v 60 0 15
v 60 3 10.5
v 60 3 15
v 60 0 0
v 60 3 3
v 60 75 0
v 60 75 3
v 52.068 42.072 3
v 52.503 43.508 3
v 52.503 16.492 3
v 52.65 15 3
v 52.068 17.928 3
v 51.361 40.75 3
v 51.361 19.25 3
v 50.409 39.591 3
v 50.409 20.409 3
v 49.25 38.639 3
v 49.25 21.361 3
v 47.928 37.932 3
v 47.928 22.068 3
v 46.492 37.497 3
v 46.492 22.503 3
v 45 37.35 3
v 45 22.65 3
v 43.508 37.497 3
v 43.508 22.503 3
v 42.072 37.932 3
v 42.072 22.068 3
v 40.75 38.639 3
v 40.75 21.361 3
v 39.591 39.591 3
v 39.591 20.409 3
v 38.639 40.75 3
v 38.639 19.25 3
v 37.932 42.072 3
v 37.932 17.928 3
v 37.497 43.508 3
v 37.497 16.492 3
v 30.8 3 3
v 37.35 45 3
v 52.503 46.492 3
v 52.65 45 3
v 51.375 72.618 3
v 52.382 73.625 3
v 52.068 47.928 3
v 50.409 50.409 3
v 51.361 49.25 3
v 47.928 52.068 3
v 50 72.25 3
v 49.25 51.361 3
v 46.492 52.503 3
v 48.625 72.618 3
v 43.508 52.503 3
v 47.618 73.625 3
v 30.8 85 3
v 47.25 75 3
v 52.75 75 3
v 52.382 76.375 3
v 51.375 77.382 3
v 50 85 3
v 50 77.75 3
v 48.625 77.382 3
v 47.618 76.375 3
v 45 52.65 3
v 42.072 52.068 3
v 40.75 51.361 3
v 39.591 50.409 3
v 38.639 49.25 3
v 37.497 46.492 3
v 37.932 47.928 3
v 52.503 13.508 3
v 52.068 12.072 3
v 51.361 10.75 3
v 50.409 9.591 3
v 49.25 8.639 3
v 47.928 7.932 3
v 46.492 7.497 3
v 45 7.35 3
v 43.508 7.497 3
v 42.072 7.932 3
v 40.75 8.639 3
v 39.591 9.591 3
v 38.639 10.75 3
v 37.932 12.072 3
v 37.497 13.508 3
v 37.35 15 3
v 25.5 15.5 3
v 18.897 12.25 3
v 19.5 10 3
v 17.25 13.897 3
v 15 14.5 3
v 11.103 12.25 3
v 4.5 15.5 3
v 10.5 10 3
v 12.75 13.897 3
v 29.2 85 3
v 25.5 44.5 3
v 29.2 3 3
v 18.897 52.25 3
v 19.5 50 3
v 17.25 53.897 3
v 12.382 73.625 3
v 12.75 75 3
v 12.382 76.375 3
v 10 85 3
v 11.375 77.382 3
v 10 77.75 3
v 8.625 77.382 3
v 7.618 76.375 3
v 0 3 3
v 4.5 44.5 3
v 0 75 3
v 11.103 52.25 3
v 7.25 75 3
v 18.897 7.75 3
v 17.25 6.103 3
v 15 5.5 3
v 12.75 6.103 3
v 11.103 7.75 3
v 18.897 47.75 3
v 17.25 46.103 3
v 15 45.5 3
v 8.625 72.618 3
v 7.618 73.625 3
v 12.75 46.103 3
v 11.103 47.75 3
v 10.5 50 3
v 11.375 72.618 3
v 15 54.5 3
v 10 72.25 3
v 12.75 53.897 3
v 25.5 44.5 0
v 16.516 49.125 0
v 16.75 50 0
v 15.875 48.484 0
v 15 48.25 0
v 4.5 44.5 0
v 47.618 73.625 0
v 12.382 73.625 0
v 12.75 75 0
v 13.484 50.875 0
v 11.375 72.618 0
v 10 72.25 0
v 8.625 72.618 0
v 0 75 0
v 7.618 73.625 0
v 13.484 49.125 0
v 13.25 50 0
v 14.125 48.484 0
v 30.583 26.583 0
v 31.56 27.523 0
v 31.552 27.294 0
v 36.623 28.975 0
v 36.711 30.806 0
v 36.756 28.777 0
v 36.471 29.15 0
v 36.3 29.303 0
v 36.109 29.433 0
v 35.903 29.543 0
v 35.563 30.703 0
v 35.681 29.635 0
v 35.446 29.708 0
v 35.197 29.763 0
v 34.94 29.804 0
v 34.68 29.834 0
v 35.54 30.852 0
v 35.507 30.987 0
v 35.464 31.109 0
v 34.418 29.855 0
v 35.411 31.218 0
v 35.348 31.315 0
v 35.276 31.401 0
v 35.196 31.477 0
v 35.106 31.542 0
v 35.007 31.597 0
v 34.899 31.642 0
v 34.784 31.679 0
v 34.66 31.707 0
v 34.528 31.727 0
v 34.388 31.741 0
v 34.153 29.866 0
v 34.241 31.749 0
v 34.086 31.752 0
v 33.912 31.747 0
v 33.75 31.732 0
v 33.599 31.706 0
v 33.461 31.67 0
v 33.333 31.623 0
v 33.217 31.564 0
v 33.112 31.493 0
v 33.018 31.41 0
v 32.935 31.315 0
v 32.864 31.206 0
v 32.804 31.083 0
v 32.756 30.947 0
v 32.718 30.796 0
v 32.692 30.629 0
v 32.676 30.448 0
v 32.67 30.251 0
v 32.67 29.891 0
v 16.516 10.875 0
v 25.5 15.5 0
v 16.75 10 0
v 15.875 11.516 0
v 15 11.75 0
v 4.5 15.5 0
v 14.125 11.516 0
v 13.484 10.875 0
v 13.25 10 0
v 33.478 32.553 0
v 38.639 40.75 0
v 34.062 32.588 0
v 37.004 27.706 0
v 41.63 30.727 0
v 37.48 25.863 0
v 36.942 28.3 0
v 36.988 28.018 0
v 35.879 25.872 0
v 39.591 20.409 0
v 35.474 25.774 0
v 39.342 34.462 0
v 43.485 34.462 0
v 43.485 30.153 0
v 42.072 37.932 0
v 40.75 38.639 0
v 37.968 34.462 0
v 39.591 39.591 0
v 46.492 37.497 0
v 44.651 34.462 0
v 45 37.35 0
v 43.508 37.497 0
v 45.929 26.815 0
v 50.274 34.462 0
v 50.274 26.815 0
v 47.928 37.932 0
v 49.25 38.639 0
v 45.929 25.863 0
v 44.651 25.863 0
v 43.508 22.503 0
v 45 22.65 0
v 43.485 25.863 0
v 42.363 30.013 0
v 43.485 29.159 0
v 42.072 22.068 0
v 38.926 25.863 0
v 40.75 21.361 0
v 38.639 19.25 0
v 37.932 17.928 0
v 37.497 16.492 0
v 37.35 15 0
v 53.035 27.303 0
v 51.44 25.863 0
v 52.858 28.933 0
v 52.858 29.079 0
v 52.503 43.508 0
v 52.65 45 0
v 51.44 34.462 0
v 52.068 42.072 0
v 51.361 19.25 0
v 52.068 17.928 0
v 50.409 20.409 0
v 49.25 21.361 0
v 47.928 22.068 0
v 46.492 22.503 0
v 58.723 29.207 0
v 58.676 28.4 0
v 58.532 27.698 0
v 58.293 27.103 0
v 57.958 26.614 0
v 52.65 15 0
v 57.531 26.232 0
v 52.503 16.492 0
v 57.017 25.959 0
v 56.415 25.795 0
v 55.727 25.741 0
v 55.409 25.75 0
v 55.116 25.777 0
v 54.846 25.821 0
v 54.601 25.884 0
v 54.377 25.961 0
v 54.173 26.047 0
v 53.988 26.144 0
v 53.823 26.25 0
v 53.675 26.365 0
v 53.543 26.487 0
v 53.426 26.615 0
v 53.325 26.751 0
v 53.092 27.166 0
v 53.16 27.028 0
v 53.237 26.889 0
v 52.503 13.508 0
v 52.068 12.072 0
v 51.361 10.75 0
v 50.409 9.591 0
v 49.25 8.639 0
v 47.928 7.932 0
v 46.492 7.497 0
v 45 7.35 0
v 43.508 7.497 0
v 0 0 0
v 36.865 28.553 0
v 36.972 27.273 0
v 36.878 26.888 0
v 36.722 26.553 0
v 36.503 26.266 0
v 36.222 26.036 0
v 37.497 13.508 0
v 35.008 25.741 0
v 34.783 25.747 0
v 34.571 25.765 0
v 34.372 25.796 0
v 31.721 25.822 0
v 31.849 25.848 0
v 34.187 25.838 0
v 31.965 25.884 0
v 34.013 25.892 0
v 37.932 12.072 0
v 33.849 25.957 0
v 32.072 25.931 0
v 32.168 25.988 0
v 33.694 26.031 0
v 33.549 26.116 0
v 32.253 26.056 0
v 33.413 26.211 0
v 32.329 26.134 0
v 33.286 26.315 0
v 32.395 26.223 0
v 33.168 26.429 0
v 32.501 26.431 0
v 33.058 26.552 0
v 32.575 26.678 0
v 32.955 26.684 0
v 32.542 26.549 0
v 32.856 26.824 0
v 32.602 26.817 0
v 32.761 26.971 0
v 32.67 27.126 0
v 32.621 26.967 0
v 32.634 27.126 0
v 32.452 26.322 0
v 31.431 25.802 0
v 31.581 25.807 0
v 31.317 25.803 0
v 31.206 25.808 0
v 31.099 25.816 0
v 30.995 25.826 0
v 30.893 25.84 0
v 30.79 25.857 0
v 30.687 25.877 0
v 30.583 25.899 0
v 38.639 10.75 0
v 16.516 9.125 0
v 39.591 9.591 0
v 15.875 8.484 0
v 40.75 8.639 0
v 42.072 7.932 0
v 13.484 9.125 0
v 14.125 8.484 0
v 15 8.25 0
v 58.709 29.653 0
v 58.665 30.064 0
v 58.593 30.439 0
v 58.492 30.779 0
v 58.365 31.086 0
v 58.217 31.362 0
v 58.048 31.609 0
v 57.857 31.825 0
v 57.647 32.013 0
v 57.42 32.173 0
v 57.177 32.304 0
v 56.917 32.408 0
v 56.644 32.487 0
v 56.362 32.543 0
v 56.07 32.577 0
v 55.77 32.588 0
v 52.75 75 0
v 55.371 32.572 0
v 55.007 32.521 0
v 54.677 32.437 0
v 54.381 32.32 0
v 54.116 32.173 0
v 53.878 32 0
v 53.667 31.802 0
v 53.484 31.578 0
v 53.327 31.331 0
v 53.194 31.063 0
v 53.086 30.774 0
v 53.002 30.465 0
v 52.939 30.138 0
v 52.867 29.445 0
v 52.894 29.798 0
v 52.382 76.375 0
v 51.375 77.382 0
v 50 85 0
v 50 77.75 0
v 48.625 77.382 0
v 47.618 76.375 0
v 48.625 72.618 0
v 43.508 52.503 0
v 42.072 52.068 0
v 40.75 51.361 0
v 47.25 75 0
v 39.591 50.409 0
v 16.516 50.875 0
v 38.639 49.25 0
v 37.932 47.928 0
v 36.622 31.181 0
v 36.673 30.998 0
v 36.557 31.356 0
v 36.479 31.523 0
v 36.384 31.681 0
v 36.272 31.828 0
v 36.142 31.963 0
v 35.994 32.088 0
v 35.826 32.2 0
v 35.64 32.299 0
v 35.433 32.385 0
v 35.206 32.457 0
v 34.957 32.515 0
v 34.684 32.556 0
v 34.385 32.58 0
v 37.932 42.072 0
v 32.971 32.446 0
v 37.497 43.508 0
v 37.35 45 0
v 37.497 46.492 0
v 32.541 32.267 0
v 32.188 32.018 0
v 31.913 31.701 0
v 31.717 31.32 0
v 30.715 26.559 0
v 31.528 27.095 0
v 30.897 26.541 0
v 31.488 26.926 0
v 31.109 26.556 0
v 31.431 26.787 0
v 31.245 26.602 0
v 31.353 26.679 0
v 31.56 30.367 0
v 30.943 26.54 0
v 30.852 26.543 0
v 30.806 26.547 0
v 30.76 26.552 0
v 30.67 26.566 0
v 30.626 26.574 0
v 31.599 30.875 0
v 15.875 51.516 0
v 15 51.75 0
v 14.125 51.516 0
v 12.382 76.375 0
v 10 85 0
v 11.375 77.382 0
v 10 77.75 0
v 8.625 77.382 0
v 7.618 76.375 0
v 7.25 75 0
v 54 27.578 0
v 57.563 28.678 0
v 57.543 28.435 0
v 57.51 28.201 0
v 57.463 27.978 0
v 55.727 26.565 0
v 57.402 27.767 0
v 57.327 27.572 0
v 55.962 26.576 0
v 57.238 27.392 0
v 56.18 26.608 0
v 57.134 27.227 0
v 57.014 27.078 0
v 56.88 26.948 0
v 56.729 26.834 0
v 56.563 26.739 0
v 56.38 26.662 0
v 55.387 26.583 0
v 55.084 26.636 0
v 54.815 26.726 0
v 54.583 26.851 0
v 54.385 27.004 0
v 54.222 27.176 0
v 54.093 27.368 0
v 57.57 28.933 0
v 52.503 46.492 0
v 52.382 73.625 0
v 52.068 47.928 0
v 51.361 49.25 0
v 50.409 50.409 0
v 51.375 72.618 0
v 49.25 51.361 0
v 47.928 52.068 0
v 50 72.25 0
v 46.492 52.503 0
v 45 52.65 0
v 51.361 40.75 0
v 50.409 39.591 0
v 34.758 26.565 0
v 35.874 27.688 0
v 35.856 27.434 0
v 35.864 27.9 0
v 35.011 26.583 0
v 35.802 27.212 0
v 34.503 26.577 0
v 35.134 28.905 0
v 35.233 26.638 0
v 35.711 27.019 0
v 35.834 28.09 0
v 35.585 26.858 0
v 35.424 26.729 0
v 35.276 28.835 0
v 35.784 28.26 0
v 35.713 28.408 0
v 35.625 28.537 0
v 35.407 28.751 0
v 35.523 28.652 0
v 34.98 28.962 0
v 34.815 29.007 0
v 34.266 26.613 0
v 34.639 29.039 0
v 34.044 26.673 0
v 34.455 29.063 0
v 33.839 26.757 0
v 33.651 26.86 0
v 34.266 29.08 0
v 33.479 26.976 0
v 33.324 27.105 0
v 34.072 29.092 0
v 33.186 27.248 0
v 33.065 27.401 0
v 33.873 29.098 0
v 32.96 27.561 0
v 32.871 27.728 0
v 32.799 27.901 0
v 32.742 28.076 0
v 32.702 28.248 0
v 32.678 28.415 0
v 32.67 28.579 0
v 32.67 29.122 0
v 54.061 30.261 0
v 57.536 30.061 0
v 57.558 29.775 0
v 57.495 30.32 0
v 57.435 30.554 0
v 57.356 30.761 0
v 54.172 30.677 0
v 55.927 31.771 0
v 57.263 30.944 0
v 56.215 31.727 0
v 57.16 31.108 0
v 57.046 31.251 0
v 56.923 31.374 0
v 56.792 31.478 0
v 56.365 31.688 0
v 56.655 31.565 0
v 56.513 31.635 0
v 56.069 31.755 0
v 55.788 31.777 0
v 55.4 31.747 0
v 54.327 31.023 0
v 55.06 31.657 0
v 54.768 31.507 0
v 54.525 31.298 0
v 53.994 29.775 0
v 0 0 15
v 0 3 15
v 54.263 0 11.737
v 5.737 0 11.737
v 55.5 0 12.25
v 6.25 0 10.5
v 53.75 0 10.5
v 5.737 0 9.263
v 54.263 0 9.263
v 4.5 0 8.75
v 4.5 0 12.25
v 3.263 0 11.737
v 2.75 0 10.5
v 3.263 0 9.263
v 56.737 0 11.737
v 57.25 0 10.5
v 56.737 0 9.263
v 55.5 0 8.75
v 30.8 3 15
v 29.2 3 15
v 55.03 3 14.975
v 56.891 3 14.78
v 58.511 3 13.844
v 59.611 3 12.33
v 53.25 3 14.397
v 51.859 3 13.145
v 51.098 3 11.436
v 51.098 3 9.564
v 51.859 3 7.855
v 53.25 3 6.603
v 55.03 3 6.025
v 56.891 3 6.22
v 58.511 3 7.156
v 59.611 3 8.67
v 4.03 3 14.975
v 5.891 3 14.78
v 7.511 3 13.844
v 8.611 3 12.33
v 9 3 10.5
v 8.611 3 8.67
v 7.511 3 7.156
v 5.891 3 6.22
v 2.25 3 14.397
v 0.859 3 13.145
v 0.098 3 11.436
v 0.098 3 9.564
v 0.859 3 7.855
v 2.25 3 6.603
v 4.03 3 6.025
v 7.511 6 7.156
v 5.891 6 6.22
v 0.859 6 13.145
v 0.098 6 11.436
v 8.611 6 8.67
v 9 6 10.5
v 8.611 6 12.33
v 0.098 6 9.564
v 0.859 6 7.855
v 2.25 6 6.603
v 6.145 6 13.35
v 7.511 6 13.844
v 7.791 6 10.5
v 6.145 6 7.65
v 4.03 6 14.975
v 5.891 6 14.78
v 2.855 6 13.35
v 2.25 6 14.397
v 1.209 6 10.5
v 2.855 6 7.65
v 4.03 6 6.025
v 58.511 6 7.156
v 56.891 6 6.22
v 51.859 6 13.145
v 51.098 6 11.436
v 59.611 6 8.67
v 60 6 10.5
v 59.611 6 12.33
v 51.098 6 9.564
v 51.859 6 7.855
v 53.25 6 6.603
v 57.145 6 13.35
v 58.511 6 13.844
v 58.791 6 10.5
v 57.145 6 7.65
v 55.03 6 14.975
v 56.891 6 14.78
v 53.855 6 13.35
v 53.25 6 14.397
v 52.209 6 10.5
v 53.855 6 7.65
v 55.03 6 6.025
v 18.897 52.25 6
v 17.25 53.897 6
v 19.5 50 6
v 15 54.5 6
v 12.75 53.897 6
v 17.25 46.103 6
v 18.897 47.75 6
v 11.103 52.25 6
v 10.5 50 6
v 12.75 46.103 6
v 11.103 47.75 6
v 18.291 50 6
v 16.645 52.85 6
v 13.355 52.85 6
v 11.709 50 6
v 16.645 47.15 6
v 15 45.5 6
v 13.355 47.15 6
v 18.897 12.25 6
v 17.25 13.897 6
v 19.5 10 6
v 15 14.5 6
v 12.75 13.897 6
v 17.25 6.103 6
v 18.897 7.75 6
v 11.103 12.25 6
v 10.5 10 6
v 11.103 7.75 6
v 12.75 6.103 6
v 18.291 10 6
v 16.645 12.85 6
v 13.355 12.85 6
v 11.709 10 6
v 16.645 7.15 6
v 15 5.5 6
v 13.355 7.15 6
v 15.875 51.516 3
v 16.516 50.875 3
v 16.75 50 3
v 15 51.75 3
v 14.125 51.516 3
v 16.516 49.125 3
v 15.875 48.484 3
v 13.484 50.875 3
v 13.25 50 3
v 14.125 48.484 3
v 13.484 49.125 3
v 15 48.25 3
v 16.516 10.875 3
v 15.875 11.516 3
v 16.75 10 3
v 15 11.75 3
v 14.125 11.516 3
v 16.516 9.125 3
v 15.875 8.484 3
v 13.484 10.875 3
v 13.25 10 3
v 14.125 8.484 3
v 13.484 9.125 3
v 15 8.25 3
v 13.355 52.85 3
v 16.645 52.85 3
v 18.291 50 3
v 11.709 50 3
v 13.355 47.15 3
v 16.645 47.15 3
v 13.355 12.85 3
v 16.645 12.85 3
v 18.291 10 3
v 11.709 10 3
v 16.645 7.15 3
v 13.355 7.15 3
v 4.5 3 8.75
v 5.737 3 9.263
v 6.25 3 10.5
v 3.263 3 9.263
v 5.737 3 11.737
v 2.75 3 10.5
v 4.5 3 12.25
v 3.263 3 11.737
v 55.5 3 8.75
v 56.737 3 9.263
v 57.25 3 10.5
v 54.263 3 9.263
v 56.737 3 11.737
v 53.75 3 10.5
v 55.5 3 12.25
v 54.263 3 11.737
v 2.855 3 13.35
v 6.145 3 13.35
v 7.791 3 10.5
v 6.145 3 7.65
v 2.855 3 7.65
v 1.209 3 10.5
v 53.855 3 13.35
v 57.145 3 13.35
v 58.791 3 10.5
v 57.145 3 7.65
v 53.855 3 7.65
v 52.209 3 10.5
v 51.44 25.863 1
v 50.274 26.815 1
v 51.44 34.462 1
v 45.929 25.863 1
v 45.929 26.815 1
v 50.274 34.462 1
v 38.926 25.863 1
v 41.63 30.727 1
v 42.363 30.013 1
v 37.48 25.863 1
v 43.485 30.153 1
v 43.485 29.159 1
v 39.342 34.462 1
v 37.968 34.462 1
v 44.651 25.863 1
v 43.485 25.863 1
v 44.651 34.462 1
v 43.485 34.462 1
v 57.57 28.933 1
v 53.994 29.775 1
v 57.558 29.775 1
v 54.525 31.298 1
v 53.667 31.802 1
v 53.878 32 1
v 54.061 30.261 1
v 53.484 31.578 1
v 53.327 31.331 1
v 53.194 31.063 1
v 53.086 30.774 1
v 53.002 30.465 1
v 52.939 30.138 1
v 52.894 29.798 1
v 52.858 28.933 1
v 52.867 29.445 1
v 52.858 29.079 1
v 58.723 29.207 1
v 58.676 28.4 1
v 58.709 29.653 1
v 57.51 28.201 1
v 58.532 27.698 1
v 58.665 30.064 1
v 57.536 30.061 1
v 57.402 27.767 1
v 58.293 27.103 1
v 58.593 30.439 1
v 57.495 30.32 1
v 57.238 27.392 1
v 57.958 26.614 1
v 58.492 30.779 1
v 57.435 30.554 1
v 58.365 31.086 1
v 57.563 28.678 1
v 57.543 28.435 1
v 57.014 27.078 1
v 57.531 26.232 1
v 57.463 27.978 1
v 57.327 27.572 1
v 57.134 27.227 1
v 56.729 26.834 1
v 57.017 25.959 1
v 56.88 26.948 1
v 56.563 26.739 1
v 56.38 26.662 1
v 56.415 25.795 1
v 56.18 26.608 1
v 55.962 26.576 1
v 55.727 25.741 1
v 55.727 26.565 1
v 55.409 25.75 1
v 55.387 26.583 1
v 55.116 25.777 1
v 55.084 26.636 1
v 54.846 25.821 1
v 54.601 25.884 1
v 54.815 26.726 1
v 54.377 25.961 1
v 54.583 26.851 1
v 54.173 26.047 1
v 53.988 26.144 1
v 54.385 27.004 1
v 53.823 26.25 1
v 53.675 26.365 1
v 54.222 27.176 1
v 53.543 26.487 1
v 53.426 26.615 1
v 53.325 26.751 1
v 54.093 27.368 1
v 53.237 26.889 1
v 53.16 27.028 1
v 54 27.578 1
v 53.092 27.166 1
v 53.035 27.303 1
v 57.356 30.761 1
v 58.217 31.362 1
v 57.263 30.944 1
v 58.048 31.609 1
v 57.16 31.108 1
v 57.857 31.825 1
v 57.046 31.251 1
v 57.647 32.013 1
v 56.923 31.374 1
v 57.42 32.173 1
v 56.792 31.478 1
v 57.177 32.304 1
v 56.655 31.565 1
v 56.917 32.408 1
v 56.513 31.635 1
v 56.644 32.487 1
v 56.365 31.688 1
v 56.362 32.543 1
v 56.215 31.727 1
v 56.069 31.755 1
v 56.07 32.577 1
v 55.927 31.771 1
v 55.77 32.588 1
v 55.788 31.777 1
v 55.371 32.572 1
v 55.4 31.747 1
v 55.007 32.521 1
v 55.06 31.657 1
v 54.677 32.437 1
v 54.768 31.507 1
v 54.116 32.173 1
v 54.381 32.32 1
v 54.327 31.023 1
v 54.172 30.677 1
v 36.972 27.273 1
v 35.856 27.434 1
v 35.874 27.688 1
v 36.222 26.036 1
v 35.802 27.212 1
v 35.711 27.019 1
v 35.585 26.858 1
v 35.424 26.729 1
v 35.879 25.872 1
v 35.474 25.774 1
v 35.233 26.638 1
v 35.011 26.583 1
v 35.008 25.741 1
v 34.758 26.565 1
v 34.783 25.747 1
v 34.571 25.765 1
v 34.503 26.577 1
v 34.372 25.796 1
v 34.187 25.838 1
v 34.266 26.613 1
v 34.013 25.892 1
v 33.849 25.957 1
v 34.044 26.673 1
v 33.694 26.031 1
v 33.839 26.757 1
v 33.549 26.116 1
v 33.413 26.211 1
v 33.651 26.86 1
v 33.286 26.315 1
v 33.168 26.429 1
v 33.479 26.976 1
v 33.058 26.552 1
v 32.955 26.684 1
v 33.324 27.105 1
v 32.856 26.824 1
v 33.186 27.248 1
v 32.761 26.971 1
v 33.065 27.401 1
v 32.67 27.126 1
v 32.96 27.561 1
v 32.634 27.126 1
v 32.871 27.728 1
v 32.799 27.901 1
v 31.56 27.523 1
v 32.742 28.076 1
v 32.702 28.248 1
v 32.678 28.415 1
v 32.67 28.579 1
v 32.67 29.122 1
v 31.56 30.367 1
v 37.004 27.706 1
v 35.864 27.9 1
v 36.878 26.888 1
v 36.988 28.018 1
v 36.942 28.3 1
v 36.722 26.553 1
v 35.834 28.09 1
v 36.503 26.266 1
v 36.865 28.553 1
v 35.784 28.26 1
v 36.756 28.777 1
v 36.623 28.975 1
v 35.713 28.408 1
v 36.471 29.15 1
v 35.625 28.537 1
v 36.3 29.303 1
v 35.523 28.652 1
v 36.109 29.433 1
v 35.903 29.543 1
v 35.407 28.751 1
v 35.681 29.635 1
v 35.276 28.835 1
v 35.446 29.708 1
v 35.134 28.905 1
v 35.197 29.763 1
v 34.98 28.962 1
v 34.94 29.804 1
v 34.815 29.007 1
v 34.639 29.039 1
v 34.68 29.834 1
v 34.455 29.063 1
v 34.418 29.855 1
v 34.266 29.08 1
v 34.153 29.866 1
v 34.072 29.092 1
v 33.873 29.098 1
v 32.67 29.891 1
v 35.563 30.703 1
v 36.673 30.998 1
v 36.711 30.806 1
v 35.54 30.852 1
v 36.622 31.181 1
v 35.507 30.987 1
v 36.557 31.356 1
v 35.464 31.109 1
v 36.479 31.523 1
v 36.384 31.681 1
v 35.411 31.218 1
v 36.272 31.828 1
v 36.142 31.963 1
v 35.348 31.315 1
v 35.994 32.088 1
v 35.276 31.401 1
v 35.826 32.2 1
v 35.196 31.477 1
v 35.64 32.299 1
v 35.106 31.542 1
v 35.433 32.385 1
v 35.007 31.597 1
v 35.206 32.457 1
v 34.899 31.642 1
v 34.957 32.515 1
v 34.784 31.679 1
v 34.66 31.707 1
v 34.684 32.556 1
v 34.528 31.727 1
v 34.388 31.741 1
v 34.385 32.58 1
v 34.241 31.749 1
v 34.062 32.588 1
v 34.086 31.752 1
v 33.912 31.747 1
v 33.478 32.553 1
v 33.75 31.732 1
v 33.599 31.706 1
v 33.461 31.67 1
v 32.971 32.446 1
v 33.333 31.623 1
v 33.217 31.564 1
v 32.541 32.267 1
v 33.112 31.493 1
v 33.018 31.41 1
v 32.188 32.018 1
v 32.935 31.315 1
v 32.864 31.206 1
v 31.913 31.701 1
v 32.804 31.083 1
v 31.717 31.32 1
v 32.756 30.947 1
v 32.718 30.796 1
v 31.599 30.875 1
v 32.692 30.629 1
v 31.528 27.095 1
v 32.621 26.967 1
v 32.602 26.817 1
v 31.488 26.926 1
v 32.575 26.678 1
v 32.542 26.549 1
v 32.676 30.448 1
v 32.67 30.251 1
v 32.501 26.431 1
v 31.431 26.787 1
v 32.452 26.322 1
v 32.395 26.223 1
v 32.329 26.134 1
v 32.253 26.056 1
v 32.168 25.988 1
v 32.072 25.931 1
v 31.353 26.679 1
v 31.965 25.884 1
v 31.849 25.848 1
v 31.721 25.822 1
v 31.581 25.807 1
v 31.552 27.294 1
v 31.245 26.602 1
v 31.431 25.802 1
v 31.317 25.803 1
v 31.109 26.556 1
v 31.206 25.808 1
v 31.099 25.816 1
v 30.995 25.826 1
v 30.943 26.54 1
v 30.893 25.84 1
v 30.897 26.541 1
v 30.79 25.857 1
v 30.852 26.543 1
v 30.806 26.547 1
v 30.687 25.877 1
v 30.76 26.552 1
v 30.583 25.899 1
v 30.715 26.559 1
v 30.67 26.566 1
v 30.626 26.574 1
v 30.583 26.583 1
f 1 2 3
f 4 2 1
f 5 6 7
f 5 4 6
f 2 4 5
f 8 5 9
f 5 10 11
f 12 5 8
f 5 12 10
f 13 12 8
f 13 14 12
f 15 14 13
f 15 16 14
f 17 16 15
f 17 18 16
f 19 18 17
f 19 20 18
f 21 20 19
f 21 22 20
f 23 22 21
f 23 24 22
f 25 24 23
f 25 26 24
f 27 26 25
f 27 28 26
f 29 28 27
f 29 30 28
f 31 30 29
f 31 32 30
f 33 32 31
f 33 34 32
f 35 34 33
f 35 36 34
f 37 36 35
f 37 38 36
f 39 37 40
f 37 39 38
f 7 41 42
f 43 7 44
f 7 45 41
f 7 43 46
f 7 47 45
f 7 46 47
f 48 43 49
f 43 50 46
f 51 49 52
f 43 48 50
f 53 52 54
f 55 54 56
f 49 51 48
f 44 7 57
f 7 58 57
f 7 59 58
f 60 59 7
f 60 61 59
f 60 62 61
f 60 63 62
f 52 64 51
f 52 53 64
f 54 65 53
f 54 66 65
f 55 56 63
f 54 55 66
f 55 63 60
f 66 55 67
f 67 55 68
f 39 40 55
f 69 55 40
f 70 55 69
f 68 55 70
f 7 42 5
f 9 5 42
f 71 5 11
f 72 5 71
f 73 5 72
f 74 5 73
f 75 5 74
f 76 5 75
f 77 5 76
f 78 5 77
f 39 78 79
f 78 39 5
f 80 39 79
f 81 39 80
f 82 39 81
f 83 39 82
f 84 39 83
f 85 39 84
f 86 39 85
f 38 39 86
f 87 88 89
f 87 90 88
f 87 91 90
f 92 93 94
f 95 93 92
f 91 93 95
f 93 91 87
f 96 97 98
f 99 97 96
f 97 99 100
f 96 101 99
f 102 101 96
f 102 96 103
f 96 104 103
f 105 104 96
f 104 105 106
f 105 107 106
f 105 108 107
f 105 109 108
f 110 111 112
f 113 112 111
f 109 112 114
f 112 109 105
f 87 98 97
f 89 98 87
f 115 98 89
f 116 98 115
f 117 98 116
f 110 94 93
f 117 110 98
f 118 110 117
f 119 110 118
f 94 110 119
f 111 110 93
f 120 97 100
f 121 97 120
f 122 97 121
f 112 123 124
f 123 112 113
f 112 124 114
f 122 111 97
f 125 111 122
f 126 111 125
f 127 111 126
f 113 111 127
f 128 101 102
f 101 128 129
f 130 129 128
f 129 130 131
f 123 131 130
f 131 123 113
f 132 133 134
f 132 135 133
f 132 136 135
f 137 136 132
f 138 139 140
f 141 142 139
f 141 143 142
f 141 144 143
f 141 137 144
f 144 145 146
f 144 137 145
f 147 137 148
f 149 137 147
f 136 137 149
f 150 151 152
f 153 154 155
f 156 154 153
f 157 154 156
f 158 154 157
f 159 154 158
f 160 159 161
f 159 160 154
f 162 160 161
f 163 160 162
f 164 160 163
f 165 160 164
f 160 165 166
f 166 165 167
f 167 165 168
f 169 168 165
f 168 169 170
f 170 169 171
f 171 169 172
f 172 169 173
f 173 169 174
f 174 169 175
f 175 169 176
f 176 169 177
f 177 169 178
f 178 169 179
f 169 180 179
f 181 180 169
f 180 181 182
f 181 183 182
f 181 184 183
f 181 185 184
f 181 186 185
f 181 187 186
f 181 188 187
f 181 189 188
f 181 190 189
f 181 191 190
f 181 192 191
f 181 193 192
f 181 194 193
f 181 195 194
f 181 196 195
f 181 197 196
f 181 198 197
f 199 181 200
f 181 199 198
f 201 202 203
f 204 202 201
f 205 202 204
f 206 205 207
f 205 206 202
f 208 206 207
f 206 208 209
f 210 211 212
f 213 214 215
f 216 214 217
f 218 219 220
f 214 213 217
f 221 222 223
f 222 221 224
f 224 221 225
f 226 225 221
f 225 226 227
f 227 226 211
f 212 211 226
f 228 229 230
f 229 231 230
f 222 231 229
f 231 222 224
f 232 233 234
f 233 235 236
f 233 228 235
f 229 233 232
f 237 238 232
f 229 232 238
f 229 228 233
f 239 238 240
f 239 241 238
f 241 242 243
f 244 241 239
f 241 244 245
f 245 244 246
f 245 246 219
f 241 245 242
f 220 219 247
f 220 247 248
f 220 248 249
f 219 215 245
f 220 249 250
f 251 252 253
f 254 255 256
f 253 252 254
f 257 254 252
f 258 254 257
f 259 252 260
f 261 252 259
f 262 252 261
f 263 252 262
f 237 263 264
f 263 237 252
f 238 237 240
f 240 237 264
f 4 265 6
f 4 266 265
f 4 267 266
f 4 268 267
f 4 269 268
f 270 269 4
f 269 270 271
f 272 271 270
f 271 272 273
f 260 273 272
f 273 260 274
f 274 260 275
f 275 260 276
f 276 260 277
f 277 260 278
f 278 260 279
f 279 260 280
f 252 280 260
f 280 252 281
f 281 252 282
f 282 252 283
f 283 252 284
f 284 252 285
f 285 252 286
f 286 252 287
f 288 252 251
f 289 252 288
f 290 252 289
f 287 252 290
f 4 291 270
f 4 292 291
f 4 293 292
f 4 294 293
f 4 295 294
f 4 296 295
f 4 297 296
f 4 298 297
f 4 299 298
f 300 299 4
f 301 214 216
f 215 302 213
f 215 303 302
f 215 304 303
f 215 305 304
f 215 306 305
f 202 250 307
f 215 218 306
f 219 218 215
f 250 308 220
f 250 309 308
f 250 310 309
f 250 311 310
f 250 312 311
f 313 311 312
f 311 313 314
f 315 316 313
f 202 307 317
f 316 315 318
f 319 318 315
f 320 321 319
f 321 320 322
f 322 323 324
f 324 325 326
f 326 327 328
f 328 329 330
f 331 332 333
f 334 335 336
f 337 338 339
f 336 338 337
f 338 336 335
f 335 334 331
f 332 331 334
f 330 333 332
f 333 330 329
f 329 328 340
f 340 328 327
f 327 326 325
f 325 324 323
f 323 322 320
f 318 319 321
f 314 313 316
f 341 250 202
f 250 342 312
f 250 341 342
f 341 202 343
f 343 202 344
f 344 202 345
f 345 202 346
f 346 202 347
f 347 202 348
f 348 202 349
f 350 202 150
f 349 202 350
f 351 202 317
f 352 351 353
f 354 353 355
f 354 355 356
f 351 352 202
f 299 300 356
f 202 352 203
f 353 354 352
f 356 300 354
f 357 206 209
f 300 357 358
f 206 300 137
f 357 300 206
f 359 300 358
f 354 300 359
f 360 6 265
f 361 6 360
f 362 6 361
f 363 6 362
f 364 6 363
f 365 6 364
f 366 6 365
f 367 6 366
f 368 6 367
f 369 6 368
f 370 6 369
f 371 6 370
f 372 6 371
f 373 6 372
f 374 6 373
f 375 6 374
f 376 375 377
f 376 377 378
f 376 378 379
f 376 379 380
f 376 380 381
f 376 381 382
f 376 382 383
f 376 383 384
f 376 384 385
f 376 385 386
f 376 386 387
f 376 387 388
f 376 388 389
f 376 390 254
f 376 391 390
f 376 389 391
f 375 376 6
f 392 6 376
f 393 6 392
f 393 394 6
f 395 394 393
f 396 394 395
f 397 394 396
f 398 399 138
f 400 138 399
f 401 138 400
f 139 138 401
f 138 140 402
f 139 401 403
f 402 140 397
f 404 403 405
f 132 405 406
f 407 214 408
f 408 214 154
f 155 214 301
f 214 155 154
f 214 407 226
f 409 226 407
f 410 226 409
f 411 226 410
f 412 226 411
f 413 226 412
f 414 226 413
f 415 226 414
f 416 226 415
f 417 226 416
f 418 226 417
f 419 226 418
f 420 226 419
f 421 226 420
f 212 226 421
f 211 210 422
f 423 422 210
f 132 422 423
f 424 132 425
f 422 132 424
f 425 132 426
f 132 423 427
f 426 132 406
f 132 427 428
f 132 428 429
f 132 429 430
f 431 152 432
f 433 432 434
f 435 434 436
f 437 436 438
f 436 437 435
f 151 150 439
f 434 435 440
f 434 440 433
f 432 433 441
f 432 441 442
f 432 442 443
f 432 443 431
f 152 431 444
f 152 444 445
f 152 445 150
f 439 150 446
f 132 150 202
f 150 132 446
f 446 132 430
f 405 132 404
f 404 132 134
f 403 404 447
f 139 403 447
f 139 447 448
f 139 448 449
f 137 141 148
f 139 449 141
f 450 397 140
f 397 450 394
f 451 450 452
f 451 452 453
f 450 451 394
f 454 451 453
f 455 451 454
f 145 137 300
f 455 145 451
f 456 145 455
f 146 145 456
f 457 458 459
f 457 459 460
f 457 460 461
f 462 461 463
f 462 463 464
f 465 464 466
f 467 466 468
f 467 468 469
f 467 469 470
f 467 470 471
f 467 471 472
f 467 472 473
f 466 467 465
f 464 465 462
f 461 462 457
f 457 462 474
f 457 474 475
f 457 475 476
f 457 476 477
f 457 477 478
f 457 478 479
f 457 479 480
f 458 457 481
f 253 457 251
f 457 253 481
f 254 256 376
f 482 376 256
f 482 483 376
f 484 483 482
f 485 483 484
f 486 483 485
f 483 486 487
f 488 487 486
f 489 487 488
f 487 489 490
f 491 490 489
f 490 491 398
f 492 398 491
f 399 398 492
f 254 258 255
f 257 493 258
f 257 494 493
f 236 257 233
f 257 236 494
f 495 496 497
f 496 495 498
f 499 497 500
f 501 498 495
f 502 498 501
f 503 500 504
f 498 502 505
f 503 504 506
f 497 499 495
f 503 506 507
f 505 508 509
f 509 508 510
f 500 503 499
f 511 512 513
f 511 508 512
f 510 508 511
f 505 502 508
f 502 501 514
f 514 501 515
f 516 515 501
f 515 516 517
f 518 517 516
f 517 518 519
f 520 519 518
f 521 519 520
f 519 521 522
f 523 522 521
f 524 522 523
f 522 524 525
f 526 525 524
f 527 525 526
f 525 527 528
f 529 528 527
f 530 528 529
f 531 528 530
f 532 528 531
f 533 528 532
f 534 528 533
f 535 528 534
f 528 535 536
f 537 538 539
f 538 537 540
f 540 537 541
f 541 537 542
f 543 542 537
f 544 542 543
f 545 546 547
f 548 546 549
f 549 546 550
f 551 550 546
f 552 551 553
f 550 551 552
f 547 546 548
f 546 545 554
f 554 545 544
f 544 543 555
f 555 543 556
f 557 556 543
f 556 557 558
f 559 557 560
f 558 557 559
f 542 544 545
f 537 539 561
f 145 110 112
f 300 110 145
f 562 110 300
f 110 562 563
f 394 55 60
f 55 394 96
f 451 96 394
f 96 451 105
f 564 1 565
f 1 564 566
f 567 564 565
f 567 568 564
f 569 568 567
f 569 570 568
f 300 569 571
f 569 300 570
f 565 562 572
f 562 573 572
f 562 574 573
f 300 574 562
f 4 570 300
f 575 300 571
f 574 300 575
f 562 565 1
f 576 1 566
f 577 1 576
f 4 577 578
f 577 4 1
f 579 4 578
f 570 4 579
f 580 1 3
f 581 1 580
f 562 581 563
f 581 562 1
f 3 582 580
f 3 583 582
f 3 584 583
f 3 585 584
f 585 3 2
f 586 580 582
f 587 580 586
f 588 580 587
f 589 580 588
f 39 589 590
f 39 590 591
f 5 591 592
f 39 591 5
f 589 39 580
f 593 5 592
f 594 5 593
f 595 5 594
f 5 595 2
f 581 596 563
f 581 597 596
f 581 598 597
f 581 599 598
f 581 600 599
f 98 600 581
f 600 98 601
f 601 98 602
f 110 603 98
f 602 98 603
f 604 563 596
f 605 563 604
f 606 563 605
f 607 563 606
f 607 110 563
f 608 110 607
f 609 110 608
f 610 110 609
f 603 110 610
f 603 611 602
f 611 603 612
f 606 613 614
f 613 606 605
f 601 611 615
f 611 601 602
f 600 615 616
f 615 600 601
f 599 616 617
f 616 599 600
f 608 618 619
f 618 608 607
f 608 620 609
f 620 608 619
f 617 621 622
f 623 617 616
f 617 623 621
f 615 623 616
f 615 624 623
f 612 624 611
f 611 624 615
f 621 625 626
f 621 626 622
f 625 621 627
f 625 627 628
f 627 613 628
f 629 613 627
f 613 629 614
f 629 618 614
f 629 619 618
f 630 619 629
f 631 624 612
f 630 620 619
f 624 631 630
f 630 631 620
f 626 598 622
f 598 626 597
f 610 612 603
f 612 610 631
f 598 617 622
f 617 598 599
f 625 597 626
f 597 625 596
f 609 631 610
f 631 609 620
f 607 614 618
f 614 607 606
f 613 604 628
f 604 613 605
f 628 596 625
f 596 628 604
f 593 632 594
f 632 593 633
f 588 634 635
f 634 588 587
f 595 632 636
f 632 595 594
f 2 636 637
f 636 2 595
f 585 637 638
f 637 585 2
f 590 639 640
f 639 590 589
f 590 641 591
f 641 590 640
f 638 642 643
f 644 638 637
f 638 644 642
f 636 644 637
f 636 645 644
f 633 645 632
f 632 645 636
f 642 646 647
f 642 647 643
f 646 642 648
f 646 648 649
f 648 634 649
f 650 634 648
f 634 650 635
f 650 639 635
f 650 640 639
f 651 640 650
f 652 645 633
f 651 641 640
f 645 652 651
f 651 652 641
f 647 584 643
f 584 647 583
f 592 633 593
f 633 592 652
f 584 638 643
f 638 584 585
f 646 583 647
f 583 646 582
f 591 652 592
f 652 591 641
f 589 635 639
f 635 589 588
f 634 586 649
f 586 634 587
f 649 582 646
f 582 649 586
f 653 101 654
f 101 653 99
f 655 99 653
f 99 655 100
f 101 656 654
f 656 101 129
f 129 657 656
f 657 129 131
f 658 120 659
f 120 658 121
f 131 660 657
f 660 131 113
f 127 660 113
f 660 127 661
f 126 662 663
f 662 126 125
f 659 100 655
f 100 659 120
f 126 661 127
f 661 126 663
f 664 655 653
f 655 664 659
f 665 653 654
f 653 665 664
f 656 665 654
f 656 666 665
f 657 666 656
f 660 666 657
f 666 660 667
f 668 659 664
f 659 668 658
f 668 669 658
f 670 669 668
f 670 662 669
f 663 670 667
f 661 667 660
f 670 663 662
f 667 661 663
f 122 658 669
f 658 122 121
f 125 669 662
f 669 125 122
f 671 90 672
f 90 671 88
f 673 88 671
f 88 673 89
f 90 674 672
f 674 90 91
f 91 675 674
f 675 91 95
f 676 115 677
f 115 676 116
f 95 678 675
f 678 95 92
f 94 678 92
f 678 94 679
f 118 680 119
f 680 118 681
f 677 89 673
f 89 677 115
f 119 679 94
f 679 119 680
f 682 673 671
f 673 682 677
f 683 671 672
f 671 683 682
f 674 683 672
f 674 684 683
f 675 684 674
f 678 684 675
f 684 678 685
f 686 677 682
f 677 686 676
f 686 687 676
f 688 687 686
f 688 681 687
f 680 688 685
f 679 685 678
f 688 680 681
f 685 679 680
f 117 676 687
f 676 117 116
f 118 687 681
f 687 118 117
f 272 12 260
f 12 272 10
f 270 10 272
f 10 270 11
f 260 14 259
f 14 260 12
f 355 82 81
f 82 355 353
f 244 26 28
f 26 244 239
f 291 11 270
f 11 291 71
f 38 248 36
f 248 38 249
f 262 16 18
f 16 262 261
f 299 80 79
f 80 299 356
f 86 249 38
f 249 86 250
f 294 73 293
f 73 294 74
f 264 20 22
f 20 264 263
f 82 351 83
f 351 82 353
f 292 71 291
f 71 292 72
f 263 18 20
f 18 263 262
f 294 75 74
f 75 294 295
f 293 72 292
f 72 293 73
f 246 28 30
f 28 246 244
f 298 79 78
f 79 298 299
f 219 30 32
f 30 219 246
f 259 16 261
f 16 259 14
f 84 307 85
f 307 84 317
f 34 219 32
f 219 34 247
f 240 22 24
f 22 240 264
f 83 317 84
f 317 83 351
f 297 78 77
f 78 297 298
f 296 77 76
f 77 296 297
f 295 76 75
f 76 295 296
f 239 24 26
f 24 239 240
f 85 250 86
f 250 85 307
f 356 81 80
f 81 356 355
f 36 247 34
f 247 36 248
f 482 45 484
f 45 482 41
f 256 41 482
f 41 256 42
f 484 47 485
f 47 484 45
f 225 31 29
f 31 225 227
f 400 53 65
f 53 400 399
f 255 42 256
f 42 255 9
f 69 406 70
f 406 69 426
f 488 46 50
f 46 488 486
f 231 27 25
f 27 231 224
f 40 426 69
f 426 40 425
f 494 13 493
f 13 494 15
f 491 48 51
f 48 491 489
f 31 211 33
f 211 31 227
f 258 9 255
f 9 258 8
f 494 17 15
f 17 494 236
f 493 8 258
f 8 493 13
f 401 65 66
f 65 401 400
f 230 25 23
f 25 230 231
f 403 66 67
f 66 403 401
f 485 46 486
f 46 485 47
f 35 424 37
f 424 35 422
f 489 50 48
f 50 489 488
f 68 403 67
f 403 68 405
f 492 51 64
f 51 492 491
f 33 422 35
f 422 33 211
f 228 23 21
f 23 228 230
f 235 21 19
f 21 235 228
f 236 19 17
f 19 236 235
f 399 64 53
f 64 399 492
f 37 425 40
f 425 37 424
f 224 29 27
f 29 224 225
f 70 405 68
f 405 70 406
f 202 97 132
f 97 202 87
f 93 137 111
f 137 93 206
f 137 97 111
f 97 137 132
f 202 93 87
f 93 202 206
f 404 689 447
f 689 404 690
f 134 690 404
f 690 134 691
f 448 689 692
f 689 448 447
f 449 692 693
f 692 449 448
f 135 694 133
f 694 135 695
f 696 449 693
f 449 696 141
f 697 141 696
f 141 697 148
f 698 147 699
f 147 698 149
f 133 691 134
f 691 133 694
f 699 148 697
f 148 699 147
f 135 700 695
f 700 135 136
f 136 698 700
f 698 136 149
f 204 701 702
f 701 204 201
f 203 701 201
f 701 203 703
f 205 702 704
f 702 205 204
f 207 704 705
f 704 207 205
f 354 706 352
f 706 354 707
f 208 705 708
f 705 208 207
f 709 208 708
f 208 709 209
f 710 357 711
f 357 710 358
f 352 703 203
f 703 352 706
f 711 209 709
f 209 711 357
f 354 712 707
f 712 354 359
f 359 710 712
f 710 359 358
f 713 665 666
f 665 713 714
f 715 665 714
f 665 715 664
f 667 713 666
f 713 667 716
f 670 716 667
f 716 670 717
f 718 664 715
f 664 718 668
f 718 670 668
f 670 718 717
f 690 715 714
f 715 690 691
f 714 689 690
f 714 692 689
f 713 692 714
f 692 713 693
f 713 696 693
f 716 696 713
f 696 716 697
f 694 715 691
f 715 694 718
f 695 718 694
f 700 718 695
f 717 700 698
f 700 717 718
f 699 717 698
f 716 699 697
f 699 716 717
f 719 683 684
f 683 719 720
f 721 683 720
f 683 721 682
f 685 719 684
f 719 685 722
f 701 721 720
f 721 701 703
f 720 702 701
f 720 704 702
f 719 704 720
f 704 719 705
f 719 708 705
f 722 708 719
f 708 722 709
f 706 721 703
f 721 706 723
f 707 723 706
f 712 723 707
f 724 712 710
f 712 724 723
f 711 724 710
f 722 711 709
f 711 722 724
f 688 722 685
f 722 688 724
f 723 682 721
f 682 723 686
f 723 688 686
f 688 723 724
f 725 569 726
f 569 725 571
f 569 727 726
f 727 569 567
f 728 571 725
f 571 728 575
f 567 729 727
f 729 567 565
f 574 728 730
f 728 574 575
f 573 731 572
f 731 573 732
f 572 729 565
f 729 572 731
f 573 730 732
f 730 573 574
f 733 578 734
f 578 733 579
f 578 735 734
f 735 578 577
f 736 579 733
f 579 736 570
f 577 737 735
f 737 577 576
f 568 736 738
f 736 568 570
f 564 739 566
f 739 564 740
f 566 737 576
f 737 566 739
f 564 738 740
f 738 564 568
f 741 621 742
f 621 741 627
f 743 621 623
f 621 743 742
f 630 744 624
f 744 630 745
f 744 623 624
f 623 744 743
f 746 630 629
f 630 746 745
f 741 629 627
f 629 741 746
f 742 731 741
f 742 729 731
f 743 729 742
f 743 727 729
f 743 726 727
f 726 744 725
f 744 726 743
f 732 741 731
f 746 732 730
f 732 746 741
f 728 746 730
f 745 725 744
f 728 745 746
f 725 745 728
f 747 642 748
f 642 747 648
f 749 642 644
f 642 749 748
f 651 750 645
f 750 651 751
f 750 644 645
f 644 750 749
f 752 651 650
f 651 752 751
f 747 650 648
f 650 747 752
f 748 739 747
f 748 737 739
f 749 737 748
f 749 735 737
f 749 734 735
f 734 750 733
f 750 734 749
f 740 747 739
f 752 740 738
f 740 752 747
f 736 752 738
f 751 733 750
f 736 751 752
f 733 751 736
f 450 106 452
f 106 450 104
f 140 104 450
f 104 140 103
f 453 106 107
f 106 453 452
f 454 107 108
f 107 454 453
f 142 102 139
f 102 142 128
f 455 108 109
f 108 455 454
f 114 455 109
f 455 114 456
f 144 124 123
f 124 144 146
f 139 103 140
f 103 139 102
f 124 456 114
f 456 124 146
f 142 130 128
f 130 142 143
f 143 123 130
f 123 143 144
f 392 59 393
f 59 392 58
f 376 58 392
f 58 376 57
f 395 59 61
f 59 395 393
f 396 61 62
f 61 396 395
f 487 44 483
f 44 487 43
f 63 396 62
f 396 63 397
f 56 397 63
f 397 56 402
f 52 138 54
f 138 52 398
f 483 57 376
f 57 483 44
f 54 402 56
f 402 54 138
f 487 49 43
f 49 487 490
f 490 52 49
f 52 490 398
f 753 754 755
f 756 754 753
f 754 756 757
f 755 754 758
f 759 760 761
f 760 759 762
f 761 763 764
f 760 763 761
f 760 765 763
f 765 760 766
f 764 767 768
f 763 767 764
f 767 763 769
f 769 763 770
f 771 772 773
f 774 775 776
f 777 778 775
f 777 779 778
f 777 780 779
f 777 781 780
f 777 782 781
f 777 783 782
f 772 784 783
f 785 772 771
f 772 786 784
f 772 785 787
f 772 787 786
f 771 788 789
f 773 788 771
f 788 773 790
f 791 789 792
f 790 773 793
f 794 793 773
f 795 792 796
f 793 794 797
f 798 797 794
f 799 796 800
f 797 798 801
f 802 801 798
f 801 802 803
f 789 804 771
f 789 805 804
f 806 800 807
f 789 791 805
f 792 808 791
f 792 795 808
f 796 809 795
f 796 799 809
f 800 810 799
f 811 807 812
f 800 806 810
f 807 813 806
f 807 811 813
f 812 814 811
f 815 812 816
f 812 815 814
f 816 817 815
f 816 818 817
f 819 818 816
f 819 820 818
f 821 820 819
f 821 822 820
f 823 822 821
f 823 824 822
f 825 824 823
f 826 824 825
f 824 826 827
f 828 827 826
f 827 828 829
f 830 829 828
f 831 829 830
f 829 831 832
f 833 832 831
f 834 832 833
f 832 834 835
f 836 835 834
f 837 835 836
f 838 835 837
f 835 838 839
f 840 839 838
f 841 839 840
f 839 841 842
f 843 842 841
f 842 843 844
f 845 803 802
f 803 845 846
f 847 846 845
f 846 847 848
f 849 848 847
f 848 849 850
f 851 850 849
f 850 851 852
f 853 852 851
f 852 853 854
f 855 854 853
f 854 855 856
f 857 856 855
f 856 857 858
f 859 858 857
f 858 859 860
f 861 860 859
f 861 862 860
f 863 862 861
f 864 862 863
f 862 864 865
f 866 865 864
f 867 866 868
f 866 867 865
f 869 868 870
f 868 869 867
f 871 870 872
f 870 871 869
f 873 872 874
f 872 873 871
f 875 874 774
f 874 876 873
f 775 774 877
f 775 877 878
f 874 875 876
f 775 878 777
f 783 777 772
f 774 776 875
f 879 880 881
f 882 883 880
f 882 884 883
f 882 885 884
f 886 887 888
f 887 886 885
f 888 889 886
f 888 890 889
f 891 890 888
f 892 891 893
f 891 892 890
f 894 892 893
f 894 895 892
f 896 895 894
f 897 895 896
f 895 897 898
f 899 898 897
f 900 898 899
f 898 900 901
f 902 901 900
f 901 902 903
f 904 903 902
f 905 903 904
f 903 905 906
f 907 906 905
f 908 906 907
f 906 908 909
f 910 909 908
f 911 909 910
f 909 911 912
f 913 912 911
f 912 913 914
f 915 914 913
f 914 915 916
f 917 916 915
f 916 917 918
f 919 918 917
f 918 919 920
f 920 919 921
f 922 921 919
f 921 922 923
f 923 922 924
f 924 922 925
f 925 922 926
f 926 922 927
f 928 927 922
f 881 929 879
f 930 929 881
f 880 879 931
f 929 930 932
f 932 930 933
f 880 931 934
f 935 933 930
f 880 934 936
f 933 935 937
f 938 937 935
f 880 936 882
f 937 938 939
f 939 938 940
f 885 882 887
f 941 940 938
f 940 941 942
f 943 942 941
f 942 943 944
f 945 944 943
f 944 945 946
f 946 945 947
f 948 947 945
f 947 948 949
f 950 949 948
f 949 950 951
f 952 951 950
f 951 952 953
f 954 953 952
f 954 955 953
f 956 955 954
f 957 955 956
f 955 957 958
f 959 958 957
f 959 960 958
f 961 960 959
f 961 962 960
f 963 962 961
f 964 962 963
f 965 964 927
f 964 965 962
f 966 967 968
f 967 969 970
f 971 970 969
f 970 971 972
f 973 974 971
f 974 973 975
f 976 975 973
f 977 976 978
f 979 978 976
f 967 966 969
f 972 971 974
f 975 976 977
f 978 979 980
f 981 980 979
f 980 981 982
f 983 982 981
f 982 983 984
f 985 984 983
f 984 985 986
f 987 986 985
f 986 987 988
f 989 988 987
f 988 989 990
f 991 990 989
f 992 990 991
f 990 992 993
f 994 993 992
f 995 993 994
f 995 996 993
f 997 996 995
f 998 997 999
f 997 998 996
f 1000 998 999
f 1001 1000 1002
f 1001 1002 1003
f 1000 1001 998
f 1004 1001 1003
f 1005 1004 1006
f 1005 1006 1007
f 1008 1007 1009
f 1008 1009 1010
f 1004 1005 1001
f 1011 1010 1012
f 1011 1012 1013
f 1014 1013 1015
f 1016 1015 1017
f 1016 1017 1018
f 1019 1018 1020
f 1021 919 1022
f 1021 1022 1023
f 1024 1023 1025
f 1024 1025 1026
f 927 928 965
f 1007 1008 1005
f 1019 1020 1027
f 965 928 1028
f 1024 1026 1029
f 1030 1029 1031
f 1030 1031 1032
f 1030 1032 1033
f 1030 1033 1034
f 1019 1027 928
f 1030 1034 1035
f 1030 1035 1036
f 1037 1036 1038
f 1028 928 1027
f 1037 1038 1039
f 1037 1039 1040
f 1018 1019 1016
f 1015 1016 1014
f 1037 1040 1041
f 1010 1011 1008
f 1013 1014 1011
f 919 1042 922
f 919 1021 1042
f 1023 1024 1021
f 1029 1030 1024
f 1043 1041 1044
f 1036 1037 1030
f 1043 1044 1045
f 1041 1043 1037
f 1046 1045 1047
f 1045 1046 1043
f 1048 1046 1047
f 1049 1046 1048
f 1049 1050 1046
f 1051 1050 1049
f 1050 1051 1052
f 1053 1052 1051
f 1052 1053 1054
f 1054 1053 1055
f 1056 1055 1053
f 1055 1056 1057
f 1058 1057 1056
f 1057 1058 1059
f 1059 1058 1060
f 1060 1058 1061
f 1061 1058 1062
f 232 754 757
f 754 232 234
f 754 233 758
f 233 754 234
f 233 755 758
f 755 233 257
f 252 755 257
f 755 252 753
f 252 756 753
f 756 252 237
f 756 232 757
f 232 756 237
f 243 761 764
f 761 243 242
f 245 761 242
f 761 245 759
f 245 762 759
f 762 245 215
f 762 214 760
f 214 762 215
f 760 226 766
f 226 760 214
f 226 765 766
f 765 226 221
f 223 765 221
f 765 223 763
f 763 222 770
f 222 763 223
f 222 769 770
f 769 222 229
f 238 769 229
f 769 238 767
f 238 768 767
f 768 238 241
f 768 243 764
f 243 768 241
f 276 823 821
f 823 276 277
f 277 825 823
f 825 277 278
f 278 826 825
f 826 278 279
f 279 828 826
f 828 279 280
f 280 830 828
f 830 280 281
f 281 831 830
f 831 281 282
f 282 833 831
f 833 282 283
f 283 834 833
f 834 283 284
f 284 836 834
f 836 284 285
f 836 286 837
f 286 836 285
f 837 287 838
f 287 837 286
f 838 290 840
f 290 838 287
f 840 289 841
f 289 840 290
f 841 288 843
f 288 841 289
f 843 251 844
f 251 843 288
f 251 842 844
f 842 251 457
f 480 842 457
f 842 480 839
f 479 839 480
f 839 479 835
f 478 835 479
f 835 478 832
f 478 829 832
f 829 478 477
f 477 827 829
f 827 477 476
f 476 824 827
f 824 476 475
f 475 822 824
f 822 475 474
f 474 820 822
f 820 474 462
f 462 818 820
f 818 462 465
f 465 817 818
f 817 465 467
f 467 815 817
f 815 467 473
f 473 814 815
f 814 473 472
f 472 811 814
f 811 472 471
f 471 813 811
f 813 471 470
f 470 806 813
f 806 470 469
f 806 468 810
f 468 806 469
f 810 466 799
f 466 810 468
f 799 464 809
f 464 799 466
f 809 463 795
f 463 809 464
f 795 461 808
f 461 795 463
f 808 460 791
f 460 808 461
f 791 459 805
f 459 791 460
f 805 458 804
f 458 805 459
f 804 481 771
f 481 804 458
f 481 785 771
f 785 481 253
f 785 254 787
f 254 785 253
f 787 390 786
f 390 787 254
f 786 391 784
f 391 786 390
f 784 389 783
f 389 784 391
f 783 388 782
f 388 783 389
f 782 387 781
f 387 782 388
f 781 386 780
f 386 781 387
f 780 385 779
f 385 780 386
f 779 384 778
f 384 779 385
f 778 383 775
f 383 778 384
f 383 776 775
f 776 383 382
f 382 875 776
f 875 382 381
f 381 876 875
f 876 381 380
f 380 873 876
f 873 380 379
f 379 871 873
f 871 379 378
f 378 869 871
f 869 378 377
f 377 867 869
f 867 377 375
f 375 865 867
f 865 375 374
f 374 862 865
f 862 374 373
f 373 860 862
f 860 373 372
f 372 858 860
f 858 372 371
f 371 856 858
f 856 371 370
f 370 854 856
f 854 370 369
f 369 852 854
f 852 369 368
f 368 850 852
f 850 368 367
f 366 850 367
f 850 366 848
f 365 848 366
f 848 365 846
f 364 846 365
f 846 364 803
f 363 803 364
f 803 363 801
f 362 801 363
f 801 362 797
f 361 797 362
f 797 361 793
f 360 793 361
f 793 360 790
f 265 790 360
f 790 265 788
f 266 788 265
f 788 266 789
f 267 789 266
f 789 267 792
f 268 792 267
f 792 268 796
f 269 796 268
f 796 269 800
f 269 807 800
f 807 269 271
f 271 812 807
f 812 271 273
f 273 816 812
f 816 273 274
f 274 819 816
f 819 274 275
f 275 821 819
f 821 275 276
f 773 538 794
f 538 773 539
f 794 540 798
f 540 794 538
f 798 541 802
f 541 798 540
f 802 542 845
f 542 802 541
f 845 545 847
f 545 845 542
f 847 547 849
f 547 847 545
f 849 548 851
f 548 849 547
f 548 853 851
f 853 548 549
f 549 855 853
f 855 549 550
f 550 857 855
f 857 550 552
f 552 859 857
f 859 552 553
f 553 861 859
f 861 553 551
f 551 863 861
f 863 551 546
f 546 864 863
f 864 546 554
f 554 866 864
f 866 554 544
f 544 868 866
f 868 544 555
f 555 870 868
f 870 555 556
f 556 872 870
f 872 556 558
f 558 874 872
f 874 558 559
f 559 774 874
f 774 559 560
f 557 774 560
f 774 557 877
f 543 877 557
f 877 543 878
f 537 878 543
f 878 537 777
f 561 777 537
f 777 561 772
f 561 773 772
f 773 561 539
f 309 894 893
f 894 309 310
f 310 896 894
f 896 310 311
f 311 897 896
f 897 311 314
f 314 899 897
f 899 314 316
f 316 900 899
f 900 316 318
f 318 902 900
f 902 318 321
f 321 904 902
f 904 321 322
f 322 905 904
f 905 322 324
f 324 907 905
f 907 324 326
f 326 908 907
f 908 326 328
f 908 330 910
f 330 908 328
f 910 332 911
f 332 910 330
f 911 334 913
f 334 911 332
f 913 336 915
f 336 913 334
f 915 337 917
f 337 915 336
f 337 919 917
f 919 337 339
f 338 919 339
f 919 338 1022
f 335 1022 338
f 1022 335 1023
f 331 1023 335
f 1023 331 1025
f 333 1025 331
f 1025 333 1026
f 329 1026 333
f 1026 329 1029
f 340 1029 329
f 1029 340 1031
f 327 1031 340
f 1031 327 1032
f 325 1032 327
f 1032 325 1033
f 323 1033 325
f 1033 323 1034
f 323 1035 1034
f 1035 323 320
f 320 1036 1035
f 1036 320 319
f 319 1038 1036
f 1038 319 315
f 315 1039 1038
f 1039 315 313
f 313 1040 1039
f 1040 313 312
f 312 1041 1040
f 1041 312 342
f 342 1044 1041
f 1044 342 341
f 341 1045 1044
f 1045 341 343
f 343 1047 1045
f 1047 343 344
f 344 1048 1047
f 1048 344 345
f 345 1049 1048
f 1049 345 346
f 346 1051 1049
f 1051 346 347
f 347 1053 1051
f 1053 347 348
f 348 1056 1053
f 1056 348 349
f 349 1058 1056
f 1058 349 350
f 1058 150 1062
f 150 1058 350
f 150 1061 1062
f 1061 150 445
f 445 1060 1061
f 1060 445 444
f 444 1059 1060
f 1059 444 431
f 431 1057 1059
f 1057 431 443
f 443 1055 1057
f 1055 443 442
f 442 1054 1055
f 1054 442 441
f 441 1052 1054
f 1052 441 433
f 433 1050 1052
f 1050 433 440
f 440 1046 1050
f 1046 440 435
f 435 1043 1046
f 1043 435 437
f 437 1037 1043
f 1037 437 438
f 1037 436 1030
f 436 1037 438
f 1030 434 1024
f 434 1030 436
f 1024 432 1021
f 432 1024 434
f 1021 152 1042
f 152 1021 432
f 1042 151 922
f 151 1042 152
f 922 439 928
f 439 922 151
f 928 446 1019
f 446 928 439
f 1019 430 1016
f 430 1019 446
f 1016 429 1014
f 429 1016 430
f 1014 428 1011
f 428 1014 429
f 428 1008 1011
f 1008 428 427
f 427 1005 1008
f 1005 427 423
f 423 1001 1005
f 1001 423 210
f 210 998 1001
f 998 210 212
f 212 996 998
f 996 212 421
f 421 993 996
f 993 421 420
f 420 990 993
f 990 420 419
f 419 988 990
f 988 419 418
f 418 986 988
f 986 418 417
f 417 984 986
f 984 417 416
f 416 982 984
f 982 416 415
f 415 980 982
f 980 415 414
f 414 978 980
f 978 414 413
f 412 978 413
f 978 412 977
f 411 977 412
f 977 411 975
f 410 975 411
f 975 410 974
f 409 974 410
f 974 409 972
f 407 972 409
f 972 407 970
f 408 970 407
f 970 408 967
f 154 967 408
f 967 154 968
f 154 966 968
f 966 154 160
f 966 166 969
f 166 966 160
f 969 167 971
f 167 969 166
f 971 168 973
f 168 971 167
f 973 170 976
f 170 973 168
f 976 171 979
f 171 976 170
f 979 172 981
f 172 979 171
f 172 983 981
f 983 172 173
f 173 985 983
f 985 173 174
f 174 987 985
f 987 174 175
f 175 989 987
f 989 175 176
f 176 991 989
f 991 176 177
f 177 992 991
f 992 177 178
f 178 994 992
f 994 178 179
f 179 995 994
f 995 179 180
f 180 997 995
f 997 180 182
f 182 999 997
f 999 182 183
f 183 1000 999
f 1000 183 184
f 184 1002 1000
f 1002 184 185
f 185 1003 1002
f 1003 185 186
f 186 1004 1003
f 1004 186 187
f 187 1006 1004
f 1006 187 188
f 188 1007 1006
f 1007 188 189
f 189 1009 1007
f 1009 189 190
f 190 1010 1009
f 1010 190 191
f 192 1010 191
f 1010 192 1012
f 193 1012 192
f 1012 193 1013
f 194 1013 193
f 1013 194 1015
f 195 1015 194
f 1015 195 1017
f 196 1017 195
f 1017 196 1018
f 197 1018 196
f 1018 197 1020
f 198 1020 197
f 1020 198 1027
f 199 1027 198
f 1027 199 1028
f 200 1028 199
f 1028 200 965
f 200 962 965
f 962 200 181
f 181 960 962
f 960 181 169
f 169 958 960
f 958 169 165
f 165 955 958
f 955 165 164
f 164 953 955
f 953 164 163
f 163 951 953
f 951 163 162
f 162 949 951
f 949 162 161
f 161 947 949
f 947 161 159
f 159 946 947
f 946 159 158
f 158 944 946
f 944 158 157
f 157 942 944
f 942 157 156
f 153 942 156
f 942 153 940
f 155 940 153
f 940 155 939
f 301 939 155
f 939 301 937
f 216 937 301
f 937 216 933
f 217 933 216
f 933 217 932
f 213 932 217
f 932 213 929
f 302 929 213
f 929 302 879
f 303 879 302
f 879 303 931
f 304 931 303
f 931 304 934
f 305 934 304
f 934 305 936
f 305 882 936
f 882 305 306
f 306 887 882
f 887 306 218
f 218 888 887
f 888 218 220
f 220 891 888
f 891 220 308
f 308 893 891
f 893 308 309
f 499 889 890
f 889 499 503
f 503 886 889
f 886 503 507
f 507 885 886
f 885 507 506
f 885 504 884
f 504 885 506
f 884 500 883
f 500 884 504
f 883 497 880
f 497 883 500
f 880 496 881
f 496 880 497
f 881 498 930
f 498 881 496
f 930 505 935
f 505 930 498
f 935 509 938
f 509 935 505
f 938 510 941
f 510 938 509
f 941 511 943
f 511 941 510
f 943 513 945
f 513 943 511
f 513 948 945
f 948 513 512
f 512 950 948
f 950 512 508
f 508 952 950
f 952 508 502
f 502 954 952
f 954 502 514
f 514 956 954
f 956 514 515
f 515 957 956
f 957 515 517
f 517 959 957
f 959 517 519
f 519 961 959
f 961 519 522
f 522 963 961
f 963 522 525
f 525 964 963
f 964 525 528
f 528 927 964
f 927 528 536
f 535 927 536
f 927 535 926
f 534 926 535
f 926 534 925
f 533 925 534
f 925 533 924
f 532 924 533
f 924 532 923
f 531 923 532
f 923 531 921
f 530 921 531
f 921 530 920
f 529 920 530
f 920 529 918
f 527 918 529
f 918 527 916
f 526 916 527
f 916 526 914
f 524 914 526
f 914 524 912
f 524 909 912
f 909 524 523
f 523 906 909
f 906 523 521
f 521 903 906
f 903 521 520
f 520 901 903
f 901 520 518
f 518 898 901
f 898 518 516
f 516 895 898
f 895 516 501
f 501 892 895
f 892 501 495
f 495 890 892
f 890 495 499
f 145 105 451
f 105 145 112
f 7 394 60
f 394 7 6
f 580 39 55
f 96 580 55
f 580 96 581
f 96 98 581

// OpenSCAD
// file: config.scad
// Paramètres de la machine

decal=-30;            // décallage du chassis xz
hauteur=400;          // hauteur totale chassis
largeur=400;          // largeur totale chassis
longueur=470;         // longueur totale chassis
hauteur_base=90;      // hauteur de la base
entraxe_y=140;        // distance entre les tiges Ø8 axe Y
entraxe_x=45;         // distance entre les tiges Ø8 axe X

couleur=[1,0.6,0];



// Paramètre des pièces et jeux

// écart plateau/courroie
// y_belt_holder
belt_h=13;      // écart entre la courroie et le plateau

// écart plateau/tiges lisses
// y_lm8uu
decal_plateau=12; // Décallage en Y

// décallage des tiges lisses Y
// support_tige8_y
decal_tiges=5;

// décallage moteur Y
// y_motor
decal_motory_z=11;
decal_motory_y=25;

// Equerres de fixation position fermée
eq_ec=10;      // écart entre profilés

// Fixations axe Z
pos_z=26;      // position des axes par rapport au profilé (>= 21)
hauteur_z=20;  // hauteur des fixations
entraxe_z=17;  // distance entre les tiges Ø8 et M5
// est ce que la tige de 8 dépasse du profilé de 30?
// si oui, on décale les fixations
decalx=max(-42/2+entraxe_z+8/2+2, 0);

// Roulements linéaires
lbd = 15; // diamètre ext
lbh = 24; // hauteur

// x_carriage
he_x=23;  // entraxe hotend x
he_y=23;  // entraxe hotend y
sen_x=13; // entraxe capteur x
sen_y=23; // entraxe capteur y

// Plats écrous
ec3=5.7;
ec4=7.2;
ec5=8.2;
ec6=10.2;

// Jeu sur plats pour les écrous glissants
jec=0.2;

// hauteur écrous
ec3h=2.4;
ec4h=3.2;
ec5h=4.7;
ec6h=5.2;

// Vis
vis3=3.5;
vis4=4.5;
vis5=5.5;
vis6=6.5;

// nombre de dents des poulies
poulie=20;

// Pas des courroies
pas=2;

// diamètre des poulies
dpoulie=poulie*pas/3.1416;
// main file
// eLKa1
// cache
// GNU GPL v3
// lkiefer <blog.lkiefer.org> and contributors
// http://www.reprap.org/wiki/ELKa
// https://github.com/kimented/elka1

include <config.scad>;

module cache(){

  hauteur=60;
  depasse=25;
  largeur=60;
  retour=15;
  ep=3;

  prise_h=29;
  prise_l=21;
  prise_axe=40;

  inter_d=15.3;
  n1=2;
  n2=1;

  fix1_dext=9;
  ch=10;
  
  echo ("cache");
  
  color (couleur){
    difference(){
      union(){
        cube([largeur,hauteur+depasse,ep]);
        cube([largeur,ep,retour]);
        //fixations bas
        translate([fix1_dext/2,ep,retour-fix1_dext/2]) rotate([-90,0,0]) cylinder(h=3,d=fix1_dext);
        translate([largeur-(fix1_dext/2),ep,retour-fix1_dext/2]) rotate([-90,0,0]) cylinder(h=3,d=fix1_dext);
        //fix prise
        translate([largeur/4,hauteur/2+prise_axe/2,ep]) cylinder(h=3, d=fix1_dext, $fn=12);
        translate([largeur/4,hauteur/2-prise_axe/2,ep]) cylinder(h=3, d=fix1_dext, $fn=12);    
      }
      
      translate([(largeur/2-prise_l)/2,(hauteur-prise_h)/2,-1]) cube([prise_l,prise_h,ep+2]); //trou prise
      translate([largeur/4,hauteur/2+prise_axe/2,-1]) cylinder(h=ep+2, d=3.5, $fn=12);  //fix prise
      translate([largeur/4,hauteur/2-prise_axe/2,-1]) cylinder(h=ep+2, d=3.5, $fn=12);  //fix prise
      translate([largeur/4,hauteur/2+prise_axe/2,ep]) cylinder(h=3+1, d=5.7*2/sqrt(3), $fn=6);  //fix prise ecrou
      translate([largeur/4,hauteur/2-prise_axe/2,ep]) cylinder(h=3+1, d=5.7*2/sqrt(3), $fn=6);  //fix prise ecrou
      
      //Trous interrupteurs
      for(j=[0:1:n1-1]){
        for(i=[0:1:n2-1]){
          translate([largeur/2+(largeur/4/n2)+(largeur/2/n2*i) , (hauteur/2/n1)+(hauteur/n1*j) , -1]) cylinder(d=inter_d, h=ep+2,$fn=32);
        }
      }
      //fixations bas
      translate([fix1_dext/2,-1,retour-fix1_dext/2]) rotate([-90,0,0]) cylinder(h=ep+3+2,d=3.5,$fn=8);
      translate([largeur-(fix1_dext/2),-1,retour-fix1_dext/2]) rotate([-90,0,0]) cylinder(h=ep+3+2,d=3.5,$fn=8);
      translate([fix1_dext/2,ep,retour-fix1_dext/2]) rotate([-90,0,0]) cylinder(h=3+1,d=5.7*2/sqrt(3), $fn=6);
      translate([largeur-(fix1_dext/2),ep,retour-fix1_dext/2]) rotate([-90,0,0]) cylinder(h=3+1,d=5.7*2/sqrt(3), $fn=6);
      
      //fixation haut
      translate([10,hauteur+15,-1]) cylinder(d=5.5,h=ep+2,$fn=12);
      translate([largeur-10,hauteur+15,-1]) cylinder(d=5.5,h=ep+2,$fn=12);
      
      translate([3/4*largeur,hauteur/2,-1]) scale([-1,1,1]) linear_extrude (height=1+1) text("eLKa", halign="center", valign="center", size=9);
      
      //chanfrein
      translate([0,hauteur+depasse-ch,-1]) rotate([0,0,45]) cube([ch*sqrt(2),ch*sqrt(2),ep+2]);
      translate([largeur,hauteur+depasse-ch,-1]) rotate([0,0,45]) cube([ch*sqrt(2),ch*sqrt(2),ep+2]);


    }

    //nervure
    translate([largeur/2,0,0]) rotate([0,-90,0]) linear_extrude(height=1.6, center=true) polygon(points=[[retour,ep],[ep,hauteur+depasse],[ep,ep]]);
  }
}

cache();
